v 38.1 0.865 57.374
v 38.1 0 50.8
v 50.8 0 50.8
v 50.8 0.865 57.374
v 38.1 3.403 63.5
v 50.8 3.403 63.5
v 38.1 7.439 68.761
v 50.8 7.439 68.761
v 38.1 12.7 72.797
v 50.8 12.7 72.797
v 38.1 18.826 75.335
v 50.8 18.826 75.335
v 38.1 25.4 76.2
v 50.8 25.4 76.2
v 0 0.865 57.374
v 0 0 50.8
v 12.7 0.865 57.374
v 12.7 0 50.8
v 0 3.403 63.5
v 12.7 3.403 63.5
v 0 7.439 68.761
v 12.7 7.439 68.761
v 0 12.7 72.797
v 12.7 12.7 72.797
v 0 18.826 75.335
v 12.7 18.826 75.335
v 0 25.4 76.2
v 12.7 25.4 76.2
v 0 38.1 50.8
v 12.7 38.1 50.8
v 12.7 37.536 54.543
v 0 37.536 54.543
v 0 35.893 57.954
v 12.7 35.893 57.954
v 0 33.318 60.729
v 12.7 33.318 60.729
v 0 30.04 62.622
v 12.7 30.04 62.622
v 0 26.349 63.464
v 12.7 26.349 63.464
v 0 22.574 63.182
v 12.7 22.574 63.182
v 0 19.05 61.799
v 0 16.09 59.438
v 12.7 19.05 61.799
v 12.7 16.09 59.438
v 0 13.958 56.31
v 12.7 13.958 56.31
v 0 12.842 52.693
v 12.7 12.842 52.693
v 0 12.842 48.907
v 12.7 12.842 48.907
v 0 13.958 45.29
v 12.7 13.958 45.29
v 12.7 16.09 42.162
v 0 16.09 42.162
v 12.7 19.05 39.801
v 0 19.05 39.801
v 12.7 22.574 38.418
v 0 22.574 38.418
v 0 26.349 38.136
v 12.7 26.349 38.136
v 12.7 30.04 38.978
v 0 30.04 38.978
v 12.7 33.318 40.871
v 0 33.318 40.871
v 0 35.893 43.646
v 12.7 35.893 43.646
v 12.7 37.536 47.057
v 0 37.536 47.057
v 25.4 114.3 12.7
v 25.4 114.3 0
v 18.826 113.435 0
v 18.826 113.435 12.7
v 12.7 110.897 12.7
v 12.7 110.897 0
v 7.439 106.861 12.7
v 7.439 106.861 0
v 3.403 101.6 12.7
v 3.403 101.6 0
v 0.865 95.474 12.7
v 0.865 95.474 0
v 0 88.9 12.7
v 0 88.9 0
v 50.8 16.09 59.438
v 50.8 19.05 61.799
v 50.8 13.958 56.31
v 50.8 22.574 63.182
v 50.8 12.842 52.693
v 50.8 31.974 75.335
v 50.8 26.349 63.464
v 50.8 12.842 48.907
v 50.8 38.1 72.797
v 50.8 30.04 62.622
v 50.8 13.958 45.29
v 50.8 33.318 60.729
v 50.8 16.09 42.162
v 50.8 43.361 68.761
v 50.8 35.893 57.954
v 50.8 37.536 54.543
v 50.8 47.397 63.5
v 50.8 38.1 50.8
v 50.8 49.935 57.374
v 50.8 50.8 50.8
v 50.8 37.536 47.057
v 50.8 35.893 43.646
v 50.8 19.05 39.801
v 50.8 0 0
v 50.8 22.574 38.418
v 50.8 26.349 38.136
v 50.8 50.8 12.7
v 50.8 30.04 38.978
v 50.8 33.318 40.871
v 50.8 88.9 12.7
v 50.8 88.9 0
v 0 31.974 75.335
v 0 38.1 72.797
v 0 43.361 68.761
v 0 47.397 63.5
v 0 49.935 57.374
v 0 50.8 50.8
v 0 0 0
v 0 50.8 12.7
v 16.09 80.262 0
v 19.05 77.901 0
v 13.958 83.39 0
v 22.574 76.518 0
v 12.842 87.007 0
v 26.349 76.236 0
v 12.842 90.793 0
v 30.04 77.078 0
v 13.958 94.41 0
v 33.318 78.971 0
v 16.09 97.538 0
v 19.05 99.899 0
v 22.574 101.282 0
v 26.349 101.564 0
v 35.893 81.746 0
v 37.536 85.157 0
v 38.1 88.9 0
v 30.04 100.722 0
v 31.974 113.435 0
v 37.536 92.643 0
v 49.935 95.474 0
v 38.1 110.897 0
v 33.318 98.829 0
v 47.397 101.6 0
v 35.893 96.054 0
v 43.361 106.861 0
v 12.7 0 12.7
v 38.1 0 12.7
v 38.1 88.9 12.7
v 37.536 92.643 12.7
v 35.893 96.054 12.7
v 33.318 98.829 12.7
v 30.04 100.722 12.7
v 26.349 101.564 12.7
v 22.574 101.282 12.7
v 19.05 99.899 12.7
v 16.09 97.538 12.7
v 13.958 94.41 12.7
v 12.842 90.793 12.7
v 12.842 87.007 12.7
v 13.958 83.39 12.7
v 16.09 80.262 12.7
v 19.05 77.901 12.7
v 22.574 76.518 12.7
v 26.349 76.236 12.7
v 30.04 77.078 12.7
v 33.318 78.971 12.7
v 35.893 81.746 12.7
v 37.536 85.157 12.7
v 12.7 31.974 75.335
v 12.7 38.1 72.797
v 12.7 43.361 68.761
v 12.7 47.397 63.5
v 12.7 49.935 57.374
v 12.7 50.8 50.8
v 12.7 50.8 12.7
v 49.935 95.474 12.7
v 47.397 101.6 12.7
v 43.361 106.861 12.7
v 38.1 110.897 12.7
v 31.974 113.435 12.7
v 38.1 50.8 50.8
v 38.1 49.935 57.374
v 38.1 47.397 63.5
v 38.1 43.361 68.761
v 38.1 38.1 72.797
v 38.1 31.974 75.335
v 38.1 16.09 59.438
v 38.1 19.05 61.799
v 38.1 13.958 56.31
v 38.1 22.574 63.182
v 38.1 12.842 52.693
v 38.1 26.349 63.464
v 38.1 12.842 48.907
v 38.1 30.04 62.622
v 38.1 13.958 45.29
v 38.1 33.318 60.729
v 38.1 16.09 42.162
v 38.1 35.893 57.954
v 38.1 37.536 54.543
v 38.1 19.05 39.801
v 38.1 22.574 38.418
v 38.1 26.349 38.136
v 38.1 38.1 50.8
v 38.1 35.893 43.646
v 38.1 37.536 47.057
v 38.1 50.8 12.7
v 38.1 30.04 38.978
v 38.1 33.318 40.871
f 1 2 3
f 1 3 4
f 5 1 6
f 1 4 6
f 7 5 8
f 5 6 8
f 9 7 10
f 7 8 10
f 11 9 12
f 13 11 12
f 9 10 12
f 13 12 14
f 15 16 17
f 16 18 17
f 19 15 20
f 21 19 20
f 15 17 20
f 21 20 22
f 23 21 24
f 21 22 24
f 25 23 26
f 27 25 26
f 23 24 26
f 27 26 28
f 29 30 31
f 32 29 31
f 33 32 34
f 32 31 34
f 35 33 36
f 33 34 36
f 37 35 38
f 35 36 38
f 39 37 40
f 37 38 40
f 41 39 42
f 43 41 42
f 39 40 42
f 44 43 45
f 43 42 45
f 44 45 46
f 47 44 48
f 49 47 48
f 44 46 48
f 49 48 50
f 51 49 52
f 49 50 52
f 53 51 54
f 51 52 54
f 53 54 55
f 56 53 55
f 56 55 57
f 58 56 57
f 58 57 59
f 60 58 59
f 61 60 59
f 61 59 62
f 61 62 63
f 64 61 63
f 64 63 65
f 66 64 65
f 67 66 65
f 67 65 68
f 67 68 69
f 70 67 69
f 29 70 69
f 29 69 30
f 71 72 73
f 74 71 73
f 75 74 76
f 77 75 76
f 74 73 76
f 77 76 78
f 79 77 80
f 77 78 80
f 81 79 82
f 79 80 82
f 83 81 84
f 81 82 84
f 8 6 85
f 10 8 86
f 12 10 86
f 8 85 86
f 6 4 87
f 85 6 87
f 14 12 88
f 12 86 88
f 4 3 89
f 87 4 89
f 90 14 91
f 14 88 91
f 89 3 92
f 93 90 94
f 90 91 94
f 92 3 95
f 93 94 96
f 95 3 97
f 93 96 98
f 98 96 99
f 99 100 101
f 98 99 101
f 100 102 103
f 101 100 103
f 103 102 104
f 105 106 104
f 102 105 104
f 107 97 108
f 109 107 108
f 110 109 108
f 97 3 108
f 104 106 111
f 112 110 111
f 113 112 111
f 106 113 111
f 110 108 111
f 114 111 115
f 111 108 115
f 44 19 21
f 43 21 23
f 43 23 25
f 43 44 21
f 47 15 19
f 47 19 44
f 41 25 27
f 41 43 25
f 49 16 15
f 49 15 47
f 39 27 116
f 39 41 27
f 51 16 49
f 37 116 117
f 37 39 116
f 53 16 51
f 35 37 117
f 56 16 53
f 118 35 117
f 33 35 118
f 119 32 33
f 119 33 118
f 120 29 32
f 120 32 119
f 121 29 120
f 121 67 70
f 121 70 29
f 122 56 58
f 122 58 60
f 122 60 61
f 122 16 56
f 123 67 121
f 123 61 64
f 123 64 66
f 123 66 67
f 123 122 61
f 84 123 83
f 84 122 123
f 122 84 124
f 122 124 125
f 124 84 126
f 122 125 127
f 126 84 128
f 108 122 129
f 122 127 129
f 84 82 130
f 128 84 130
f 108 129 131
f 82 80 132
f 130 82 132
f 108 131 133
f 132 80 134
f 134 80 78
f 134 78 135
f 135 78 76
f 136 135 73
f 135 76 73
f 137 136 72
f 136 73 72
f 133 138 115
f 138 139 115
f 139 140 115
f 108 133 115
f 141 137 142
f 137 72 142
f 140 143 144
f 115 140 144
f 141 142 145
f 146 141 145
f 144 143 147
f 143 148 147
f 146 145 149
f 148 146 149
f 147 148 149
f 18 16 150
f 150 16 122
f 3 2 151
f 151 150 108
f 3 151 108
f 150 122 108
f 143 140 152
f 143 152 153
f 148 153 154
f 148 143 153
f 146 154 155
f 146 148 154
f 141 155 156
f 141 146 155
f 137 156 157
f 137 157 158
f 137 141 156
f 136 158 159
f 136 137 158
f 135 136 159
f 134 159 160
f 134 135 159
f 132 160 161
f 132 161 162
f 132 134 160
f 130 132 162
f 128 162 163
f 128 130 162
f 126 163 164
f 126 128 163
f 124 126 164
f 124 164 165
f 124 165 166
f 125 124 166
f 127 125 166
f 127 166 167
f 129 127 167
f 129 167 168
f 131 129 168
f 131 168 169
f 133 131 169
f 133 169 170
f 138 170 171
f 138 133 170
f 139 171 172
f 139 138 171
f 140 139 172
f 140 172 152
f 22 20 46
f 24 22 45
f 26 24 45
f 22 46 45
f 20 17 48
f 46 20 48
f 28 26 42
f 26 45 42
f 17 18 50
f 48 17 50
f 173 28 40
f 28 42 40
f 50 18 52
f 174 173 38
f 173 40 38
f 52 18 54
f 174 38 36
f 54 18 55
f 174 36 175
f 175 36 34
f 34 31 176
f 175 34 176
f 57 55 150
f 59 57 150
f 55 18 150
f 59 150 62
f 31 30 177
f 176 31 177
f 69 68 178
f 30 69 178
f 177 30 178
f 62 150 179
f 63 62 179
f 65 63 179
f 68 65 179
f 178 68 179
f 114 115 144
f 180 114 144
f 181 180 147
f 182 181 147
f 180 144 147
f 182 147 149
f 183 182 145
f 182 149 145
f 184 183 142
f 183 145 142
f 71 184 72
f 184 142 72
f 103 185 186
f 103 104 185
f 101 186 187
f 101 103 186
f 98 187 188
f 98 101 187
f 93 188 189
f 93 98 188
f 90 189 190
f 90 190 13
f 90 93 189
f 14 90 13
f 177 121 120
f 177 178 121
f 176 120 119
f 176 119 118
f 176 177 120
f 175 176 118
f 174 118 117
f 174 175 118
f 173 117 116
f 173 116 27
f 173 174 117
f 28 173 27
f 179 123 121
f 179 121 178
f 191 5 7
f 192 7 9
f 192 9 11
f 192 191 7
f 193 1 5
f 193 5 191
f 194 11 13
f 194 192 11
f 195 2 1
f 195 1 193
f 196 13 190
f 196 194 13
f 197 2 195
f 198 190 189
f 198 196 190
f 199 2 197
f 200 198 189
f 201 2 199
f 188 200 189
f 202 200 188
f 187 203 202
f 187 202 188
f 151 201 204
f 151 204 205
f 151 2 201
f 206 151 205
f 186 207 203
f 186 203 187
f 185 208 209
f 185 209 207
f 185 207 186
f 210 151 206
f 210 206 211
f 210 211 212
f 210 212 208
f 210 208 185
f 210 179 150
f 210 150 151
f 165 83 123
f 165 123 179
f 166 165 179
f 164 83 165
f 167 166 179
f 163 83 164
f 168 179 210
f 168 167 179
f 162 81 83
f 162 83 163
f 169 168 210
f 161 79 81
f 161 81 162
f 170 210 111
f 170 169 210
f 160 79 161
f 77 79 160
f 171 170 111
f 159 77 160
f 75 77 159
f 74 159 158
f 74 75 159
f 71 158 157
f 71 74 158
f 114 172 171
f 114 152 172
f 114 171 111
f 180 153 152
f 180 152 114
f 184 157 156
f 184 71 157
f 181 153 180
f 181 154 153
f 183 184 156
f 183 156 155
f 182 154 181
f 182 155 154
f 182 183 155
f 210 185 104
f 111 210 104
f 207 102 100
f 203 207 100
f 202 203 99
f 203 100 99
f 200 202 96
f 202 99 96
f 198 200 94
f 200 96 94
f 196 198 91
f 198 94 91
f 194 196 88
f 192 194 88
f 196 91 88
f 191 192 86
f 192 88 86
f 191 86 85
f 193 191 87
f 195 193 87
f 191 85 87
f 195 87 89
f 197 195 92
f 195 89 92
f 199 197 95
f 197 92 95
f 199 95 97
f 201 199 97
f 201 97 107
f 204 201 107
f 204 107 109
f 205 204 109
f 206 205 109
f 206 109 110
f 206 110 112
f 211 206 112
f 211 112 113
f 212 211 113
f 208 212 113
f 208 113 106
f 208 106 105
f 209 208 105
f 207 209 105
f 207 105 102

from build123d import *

# Parameters (mm, degrees)
F0_R     = 12.7
F1_DEPTH = 12.7
F2_W     = 12.7
F2_H     = 50.8
F3_DEPTH = 63.5
F4_R     = 25.39999
F6_D     = 25.4


# Not quite as in the source:
# - a fillet or chamfer is up to 0.001 mm smaller than in the source, because OpenCascade refuses the exact size


with BuildPart() as f1:
    # F0 (on Top) → F1 (new body)
    with BuildSketch(Plane.XY):
        with BuildLine():
            Line((0, 88.9), (0, 0))
            Line((0, 0), (50.8, 0))
            Line((50.8, 0), (50.8, 88.9))
            ThreePointArc((50.8, 88.9), (43.3605122421, 106.8605122421), (25.4, 114.3))
            ThreePointArc((25.4, 114.3), (7.4394877579, 106.8605122421), (0, 88.9))
        make_face()
        with Locations((25.4, 88.9)):
            Circle(F0_R, mode=Mode.SUBTRACT)
    extrude(amount=F1_DEPTH)

    # F2 (on face) → F3 (join)
    with BuildSketch(Plane.XY.offset(12.7)):
        with Locations((6.35, 25.4)):
            Rectangle(F2_W, F2_H)
        with Locations((44.45, 25.4)):
            Rectangle(F2_W, F2_H)
    extrude(amount=F3_DEPTH)

    # F4 (radius 25.4 in the source; OpenCascade refuses exactly that, so slightly less here)
    f4_edges = [f1.edges().sort_by_distance(p)[0] for p in [
        (6.35, 50.8, 76.2),
        (6.35, 0, 76.2),
        (44.45, 0, 76.2),
        (44.45, 50.8, 76.2),
    ]]
    fillet(f4_edges, radius=F4_R)

    # F6 (through all)
    with Locations(Plane(origin=(0, 0, 0), x_dir=(0, -1, 0), z_dir=(-1, 0, 0))):
        with Locations((-25.4, 50.8)):
            Hole(F6_D / 2)


solid = f1.part
